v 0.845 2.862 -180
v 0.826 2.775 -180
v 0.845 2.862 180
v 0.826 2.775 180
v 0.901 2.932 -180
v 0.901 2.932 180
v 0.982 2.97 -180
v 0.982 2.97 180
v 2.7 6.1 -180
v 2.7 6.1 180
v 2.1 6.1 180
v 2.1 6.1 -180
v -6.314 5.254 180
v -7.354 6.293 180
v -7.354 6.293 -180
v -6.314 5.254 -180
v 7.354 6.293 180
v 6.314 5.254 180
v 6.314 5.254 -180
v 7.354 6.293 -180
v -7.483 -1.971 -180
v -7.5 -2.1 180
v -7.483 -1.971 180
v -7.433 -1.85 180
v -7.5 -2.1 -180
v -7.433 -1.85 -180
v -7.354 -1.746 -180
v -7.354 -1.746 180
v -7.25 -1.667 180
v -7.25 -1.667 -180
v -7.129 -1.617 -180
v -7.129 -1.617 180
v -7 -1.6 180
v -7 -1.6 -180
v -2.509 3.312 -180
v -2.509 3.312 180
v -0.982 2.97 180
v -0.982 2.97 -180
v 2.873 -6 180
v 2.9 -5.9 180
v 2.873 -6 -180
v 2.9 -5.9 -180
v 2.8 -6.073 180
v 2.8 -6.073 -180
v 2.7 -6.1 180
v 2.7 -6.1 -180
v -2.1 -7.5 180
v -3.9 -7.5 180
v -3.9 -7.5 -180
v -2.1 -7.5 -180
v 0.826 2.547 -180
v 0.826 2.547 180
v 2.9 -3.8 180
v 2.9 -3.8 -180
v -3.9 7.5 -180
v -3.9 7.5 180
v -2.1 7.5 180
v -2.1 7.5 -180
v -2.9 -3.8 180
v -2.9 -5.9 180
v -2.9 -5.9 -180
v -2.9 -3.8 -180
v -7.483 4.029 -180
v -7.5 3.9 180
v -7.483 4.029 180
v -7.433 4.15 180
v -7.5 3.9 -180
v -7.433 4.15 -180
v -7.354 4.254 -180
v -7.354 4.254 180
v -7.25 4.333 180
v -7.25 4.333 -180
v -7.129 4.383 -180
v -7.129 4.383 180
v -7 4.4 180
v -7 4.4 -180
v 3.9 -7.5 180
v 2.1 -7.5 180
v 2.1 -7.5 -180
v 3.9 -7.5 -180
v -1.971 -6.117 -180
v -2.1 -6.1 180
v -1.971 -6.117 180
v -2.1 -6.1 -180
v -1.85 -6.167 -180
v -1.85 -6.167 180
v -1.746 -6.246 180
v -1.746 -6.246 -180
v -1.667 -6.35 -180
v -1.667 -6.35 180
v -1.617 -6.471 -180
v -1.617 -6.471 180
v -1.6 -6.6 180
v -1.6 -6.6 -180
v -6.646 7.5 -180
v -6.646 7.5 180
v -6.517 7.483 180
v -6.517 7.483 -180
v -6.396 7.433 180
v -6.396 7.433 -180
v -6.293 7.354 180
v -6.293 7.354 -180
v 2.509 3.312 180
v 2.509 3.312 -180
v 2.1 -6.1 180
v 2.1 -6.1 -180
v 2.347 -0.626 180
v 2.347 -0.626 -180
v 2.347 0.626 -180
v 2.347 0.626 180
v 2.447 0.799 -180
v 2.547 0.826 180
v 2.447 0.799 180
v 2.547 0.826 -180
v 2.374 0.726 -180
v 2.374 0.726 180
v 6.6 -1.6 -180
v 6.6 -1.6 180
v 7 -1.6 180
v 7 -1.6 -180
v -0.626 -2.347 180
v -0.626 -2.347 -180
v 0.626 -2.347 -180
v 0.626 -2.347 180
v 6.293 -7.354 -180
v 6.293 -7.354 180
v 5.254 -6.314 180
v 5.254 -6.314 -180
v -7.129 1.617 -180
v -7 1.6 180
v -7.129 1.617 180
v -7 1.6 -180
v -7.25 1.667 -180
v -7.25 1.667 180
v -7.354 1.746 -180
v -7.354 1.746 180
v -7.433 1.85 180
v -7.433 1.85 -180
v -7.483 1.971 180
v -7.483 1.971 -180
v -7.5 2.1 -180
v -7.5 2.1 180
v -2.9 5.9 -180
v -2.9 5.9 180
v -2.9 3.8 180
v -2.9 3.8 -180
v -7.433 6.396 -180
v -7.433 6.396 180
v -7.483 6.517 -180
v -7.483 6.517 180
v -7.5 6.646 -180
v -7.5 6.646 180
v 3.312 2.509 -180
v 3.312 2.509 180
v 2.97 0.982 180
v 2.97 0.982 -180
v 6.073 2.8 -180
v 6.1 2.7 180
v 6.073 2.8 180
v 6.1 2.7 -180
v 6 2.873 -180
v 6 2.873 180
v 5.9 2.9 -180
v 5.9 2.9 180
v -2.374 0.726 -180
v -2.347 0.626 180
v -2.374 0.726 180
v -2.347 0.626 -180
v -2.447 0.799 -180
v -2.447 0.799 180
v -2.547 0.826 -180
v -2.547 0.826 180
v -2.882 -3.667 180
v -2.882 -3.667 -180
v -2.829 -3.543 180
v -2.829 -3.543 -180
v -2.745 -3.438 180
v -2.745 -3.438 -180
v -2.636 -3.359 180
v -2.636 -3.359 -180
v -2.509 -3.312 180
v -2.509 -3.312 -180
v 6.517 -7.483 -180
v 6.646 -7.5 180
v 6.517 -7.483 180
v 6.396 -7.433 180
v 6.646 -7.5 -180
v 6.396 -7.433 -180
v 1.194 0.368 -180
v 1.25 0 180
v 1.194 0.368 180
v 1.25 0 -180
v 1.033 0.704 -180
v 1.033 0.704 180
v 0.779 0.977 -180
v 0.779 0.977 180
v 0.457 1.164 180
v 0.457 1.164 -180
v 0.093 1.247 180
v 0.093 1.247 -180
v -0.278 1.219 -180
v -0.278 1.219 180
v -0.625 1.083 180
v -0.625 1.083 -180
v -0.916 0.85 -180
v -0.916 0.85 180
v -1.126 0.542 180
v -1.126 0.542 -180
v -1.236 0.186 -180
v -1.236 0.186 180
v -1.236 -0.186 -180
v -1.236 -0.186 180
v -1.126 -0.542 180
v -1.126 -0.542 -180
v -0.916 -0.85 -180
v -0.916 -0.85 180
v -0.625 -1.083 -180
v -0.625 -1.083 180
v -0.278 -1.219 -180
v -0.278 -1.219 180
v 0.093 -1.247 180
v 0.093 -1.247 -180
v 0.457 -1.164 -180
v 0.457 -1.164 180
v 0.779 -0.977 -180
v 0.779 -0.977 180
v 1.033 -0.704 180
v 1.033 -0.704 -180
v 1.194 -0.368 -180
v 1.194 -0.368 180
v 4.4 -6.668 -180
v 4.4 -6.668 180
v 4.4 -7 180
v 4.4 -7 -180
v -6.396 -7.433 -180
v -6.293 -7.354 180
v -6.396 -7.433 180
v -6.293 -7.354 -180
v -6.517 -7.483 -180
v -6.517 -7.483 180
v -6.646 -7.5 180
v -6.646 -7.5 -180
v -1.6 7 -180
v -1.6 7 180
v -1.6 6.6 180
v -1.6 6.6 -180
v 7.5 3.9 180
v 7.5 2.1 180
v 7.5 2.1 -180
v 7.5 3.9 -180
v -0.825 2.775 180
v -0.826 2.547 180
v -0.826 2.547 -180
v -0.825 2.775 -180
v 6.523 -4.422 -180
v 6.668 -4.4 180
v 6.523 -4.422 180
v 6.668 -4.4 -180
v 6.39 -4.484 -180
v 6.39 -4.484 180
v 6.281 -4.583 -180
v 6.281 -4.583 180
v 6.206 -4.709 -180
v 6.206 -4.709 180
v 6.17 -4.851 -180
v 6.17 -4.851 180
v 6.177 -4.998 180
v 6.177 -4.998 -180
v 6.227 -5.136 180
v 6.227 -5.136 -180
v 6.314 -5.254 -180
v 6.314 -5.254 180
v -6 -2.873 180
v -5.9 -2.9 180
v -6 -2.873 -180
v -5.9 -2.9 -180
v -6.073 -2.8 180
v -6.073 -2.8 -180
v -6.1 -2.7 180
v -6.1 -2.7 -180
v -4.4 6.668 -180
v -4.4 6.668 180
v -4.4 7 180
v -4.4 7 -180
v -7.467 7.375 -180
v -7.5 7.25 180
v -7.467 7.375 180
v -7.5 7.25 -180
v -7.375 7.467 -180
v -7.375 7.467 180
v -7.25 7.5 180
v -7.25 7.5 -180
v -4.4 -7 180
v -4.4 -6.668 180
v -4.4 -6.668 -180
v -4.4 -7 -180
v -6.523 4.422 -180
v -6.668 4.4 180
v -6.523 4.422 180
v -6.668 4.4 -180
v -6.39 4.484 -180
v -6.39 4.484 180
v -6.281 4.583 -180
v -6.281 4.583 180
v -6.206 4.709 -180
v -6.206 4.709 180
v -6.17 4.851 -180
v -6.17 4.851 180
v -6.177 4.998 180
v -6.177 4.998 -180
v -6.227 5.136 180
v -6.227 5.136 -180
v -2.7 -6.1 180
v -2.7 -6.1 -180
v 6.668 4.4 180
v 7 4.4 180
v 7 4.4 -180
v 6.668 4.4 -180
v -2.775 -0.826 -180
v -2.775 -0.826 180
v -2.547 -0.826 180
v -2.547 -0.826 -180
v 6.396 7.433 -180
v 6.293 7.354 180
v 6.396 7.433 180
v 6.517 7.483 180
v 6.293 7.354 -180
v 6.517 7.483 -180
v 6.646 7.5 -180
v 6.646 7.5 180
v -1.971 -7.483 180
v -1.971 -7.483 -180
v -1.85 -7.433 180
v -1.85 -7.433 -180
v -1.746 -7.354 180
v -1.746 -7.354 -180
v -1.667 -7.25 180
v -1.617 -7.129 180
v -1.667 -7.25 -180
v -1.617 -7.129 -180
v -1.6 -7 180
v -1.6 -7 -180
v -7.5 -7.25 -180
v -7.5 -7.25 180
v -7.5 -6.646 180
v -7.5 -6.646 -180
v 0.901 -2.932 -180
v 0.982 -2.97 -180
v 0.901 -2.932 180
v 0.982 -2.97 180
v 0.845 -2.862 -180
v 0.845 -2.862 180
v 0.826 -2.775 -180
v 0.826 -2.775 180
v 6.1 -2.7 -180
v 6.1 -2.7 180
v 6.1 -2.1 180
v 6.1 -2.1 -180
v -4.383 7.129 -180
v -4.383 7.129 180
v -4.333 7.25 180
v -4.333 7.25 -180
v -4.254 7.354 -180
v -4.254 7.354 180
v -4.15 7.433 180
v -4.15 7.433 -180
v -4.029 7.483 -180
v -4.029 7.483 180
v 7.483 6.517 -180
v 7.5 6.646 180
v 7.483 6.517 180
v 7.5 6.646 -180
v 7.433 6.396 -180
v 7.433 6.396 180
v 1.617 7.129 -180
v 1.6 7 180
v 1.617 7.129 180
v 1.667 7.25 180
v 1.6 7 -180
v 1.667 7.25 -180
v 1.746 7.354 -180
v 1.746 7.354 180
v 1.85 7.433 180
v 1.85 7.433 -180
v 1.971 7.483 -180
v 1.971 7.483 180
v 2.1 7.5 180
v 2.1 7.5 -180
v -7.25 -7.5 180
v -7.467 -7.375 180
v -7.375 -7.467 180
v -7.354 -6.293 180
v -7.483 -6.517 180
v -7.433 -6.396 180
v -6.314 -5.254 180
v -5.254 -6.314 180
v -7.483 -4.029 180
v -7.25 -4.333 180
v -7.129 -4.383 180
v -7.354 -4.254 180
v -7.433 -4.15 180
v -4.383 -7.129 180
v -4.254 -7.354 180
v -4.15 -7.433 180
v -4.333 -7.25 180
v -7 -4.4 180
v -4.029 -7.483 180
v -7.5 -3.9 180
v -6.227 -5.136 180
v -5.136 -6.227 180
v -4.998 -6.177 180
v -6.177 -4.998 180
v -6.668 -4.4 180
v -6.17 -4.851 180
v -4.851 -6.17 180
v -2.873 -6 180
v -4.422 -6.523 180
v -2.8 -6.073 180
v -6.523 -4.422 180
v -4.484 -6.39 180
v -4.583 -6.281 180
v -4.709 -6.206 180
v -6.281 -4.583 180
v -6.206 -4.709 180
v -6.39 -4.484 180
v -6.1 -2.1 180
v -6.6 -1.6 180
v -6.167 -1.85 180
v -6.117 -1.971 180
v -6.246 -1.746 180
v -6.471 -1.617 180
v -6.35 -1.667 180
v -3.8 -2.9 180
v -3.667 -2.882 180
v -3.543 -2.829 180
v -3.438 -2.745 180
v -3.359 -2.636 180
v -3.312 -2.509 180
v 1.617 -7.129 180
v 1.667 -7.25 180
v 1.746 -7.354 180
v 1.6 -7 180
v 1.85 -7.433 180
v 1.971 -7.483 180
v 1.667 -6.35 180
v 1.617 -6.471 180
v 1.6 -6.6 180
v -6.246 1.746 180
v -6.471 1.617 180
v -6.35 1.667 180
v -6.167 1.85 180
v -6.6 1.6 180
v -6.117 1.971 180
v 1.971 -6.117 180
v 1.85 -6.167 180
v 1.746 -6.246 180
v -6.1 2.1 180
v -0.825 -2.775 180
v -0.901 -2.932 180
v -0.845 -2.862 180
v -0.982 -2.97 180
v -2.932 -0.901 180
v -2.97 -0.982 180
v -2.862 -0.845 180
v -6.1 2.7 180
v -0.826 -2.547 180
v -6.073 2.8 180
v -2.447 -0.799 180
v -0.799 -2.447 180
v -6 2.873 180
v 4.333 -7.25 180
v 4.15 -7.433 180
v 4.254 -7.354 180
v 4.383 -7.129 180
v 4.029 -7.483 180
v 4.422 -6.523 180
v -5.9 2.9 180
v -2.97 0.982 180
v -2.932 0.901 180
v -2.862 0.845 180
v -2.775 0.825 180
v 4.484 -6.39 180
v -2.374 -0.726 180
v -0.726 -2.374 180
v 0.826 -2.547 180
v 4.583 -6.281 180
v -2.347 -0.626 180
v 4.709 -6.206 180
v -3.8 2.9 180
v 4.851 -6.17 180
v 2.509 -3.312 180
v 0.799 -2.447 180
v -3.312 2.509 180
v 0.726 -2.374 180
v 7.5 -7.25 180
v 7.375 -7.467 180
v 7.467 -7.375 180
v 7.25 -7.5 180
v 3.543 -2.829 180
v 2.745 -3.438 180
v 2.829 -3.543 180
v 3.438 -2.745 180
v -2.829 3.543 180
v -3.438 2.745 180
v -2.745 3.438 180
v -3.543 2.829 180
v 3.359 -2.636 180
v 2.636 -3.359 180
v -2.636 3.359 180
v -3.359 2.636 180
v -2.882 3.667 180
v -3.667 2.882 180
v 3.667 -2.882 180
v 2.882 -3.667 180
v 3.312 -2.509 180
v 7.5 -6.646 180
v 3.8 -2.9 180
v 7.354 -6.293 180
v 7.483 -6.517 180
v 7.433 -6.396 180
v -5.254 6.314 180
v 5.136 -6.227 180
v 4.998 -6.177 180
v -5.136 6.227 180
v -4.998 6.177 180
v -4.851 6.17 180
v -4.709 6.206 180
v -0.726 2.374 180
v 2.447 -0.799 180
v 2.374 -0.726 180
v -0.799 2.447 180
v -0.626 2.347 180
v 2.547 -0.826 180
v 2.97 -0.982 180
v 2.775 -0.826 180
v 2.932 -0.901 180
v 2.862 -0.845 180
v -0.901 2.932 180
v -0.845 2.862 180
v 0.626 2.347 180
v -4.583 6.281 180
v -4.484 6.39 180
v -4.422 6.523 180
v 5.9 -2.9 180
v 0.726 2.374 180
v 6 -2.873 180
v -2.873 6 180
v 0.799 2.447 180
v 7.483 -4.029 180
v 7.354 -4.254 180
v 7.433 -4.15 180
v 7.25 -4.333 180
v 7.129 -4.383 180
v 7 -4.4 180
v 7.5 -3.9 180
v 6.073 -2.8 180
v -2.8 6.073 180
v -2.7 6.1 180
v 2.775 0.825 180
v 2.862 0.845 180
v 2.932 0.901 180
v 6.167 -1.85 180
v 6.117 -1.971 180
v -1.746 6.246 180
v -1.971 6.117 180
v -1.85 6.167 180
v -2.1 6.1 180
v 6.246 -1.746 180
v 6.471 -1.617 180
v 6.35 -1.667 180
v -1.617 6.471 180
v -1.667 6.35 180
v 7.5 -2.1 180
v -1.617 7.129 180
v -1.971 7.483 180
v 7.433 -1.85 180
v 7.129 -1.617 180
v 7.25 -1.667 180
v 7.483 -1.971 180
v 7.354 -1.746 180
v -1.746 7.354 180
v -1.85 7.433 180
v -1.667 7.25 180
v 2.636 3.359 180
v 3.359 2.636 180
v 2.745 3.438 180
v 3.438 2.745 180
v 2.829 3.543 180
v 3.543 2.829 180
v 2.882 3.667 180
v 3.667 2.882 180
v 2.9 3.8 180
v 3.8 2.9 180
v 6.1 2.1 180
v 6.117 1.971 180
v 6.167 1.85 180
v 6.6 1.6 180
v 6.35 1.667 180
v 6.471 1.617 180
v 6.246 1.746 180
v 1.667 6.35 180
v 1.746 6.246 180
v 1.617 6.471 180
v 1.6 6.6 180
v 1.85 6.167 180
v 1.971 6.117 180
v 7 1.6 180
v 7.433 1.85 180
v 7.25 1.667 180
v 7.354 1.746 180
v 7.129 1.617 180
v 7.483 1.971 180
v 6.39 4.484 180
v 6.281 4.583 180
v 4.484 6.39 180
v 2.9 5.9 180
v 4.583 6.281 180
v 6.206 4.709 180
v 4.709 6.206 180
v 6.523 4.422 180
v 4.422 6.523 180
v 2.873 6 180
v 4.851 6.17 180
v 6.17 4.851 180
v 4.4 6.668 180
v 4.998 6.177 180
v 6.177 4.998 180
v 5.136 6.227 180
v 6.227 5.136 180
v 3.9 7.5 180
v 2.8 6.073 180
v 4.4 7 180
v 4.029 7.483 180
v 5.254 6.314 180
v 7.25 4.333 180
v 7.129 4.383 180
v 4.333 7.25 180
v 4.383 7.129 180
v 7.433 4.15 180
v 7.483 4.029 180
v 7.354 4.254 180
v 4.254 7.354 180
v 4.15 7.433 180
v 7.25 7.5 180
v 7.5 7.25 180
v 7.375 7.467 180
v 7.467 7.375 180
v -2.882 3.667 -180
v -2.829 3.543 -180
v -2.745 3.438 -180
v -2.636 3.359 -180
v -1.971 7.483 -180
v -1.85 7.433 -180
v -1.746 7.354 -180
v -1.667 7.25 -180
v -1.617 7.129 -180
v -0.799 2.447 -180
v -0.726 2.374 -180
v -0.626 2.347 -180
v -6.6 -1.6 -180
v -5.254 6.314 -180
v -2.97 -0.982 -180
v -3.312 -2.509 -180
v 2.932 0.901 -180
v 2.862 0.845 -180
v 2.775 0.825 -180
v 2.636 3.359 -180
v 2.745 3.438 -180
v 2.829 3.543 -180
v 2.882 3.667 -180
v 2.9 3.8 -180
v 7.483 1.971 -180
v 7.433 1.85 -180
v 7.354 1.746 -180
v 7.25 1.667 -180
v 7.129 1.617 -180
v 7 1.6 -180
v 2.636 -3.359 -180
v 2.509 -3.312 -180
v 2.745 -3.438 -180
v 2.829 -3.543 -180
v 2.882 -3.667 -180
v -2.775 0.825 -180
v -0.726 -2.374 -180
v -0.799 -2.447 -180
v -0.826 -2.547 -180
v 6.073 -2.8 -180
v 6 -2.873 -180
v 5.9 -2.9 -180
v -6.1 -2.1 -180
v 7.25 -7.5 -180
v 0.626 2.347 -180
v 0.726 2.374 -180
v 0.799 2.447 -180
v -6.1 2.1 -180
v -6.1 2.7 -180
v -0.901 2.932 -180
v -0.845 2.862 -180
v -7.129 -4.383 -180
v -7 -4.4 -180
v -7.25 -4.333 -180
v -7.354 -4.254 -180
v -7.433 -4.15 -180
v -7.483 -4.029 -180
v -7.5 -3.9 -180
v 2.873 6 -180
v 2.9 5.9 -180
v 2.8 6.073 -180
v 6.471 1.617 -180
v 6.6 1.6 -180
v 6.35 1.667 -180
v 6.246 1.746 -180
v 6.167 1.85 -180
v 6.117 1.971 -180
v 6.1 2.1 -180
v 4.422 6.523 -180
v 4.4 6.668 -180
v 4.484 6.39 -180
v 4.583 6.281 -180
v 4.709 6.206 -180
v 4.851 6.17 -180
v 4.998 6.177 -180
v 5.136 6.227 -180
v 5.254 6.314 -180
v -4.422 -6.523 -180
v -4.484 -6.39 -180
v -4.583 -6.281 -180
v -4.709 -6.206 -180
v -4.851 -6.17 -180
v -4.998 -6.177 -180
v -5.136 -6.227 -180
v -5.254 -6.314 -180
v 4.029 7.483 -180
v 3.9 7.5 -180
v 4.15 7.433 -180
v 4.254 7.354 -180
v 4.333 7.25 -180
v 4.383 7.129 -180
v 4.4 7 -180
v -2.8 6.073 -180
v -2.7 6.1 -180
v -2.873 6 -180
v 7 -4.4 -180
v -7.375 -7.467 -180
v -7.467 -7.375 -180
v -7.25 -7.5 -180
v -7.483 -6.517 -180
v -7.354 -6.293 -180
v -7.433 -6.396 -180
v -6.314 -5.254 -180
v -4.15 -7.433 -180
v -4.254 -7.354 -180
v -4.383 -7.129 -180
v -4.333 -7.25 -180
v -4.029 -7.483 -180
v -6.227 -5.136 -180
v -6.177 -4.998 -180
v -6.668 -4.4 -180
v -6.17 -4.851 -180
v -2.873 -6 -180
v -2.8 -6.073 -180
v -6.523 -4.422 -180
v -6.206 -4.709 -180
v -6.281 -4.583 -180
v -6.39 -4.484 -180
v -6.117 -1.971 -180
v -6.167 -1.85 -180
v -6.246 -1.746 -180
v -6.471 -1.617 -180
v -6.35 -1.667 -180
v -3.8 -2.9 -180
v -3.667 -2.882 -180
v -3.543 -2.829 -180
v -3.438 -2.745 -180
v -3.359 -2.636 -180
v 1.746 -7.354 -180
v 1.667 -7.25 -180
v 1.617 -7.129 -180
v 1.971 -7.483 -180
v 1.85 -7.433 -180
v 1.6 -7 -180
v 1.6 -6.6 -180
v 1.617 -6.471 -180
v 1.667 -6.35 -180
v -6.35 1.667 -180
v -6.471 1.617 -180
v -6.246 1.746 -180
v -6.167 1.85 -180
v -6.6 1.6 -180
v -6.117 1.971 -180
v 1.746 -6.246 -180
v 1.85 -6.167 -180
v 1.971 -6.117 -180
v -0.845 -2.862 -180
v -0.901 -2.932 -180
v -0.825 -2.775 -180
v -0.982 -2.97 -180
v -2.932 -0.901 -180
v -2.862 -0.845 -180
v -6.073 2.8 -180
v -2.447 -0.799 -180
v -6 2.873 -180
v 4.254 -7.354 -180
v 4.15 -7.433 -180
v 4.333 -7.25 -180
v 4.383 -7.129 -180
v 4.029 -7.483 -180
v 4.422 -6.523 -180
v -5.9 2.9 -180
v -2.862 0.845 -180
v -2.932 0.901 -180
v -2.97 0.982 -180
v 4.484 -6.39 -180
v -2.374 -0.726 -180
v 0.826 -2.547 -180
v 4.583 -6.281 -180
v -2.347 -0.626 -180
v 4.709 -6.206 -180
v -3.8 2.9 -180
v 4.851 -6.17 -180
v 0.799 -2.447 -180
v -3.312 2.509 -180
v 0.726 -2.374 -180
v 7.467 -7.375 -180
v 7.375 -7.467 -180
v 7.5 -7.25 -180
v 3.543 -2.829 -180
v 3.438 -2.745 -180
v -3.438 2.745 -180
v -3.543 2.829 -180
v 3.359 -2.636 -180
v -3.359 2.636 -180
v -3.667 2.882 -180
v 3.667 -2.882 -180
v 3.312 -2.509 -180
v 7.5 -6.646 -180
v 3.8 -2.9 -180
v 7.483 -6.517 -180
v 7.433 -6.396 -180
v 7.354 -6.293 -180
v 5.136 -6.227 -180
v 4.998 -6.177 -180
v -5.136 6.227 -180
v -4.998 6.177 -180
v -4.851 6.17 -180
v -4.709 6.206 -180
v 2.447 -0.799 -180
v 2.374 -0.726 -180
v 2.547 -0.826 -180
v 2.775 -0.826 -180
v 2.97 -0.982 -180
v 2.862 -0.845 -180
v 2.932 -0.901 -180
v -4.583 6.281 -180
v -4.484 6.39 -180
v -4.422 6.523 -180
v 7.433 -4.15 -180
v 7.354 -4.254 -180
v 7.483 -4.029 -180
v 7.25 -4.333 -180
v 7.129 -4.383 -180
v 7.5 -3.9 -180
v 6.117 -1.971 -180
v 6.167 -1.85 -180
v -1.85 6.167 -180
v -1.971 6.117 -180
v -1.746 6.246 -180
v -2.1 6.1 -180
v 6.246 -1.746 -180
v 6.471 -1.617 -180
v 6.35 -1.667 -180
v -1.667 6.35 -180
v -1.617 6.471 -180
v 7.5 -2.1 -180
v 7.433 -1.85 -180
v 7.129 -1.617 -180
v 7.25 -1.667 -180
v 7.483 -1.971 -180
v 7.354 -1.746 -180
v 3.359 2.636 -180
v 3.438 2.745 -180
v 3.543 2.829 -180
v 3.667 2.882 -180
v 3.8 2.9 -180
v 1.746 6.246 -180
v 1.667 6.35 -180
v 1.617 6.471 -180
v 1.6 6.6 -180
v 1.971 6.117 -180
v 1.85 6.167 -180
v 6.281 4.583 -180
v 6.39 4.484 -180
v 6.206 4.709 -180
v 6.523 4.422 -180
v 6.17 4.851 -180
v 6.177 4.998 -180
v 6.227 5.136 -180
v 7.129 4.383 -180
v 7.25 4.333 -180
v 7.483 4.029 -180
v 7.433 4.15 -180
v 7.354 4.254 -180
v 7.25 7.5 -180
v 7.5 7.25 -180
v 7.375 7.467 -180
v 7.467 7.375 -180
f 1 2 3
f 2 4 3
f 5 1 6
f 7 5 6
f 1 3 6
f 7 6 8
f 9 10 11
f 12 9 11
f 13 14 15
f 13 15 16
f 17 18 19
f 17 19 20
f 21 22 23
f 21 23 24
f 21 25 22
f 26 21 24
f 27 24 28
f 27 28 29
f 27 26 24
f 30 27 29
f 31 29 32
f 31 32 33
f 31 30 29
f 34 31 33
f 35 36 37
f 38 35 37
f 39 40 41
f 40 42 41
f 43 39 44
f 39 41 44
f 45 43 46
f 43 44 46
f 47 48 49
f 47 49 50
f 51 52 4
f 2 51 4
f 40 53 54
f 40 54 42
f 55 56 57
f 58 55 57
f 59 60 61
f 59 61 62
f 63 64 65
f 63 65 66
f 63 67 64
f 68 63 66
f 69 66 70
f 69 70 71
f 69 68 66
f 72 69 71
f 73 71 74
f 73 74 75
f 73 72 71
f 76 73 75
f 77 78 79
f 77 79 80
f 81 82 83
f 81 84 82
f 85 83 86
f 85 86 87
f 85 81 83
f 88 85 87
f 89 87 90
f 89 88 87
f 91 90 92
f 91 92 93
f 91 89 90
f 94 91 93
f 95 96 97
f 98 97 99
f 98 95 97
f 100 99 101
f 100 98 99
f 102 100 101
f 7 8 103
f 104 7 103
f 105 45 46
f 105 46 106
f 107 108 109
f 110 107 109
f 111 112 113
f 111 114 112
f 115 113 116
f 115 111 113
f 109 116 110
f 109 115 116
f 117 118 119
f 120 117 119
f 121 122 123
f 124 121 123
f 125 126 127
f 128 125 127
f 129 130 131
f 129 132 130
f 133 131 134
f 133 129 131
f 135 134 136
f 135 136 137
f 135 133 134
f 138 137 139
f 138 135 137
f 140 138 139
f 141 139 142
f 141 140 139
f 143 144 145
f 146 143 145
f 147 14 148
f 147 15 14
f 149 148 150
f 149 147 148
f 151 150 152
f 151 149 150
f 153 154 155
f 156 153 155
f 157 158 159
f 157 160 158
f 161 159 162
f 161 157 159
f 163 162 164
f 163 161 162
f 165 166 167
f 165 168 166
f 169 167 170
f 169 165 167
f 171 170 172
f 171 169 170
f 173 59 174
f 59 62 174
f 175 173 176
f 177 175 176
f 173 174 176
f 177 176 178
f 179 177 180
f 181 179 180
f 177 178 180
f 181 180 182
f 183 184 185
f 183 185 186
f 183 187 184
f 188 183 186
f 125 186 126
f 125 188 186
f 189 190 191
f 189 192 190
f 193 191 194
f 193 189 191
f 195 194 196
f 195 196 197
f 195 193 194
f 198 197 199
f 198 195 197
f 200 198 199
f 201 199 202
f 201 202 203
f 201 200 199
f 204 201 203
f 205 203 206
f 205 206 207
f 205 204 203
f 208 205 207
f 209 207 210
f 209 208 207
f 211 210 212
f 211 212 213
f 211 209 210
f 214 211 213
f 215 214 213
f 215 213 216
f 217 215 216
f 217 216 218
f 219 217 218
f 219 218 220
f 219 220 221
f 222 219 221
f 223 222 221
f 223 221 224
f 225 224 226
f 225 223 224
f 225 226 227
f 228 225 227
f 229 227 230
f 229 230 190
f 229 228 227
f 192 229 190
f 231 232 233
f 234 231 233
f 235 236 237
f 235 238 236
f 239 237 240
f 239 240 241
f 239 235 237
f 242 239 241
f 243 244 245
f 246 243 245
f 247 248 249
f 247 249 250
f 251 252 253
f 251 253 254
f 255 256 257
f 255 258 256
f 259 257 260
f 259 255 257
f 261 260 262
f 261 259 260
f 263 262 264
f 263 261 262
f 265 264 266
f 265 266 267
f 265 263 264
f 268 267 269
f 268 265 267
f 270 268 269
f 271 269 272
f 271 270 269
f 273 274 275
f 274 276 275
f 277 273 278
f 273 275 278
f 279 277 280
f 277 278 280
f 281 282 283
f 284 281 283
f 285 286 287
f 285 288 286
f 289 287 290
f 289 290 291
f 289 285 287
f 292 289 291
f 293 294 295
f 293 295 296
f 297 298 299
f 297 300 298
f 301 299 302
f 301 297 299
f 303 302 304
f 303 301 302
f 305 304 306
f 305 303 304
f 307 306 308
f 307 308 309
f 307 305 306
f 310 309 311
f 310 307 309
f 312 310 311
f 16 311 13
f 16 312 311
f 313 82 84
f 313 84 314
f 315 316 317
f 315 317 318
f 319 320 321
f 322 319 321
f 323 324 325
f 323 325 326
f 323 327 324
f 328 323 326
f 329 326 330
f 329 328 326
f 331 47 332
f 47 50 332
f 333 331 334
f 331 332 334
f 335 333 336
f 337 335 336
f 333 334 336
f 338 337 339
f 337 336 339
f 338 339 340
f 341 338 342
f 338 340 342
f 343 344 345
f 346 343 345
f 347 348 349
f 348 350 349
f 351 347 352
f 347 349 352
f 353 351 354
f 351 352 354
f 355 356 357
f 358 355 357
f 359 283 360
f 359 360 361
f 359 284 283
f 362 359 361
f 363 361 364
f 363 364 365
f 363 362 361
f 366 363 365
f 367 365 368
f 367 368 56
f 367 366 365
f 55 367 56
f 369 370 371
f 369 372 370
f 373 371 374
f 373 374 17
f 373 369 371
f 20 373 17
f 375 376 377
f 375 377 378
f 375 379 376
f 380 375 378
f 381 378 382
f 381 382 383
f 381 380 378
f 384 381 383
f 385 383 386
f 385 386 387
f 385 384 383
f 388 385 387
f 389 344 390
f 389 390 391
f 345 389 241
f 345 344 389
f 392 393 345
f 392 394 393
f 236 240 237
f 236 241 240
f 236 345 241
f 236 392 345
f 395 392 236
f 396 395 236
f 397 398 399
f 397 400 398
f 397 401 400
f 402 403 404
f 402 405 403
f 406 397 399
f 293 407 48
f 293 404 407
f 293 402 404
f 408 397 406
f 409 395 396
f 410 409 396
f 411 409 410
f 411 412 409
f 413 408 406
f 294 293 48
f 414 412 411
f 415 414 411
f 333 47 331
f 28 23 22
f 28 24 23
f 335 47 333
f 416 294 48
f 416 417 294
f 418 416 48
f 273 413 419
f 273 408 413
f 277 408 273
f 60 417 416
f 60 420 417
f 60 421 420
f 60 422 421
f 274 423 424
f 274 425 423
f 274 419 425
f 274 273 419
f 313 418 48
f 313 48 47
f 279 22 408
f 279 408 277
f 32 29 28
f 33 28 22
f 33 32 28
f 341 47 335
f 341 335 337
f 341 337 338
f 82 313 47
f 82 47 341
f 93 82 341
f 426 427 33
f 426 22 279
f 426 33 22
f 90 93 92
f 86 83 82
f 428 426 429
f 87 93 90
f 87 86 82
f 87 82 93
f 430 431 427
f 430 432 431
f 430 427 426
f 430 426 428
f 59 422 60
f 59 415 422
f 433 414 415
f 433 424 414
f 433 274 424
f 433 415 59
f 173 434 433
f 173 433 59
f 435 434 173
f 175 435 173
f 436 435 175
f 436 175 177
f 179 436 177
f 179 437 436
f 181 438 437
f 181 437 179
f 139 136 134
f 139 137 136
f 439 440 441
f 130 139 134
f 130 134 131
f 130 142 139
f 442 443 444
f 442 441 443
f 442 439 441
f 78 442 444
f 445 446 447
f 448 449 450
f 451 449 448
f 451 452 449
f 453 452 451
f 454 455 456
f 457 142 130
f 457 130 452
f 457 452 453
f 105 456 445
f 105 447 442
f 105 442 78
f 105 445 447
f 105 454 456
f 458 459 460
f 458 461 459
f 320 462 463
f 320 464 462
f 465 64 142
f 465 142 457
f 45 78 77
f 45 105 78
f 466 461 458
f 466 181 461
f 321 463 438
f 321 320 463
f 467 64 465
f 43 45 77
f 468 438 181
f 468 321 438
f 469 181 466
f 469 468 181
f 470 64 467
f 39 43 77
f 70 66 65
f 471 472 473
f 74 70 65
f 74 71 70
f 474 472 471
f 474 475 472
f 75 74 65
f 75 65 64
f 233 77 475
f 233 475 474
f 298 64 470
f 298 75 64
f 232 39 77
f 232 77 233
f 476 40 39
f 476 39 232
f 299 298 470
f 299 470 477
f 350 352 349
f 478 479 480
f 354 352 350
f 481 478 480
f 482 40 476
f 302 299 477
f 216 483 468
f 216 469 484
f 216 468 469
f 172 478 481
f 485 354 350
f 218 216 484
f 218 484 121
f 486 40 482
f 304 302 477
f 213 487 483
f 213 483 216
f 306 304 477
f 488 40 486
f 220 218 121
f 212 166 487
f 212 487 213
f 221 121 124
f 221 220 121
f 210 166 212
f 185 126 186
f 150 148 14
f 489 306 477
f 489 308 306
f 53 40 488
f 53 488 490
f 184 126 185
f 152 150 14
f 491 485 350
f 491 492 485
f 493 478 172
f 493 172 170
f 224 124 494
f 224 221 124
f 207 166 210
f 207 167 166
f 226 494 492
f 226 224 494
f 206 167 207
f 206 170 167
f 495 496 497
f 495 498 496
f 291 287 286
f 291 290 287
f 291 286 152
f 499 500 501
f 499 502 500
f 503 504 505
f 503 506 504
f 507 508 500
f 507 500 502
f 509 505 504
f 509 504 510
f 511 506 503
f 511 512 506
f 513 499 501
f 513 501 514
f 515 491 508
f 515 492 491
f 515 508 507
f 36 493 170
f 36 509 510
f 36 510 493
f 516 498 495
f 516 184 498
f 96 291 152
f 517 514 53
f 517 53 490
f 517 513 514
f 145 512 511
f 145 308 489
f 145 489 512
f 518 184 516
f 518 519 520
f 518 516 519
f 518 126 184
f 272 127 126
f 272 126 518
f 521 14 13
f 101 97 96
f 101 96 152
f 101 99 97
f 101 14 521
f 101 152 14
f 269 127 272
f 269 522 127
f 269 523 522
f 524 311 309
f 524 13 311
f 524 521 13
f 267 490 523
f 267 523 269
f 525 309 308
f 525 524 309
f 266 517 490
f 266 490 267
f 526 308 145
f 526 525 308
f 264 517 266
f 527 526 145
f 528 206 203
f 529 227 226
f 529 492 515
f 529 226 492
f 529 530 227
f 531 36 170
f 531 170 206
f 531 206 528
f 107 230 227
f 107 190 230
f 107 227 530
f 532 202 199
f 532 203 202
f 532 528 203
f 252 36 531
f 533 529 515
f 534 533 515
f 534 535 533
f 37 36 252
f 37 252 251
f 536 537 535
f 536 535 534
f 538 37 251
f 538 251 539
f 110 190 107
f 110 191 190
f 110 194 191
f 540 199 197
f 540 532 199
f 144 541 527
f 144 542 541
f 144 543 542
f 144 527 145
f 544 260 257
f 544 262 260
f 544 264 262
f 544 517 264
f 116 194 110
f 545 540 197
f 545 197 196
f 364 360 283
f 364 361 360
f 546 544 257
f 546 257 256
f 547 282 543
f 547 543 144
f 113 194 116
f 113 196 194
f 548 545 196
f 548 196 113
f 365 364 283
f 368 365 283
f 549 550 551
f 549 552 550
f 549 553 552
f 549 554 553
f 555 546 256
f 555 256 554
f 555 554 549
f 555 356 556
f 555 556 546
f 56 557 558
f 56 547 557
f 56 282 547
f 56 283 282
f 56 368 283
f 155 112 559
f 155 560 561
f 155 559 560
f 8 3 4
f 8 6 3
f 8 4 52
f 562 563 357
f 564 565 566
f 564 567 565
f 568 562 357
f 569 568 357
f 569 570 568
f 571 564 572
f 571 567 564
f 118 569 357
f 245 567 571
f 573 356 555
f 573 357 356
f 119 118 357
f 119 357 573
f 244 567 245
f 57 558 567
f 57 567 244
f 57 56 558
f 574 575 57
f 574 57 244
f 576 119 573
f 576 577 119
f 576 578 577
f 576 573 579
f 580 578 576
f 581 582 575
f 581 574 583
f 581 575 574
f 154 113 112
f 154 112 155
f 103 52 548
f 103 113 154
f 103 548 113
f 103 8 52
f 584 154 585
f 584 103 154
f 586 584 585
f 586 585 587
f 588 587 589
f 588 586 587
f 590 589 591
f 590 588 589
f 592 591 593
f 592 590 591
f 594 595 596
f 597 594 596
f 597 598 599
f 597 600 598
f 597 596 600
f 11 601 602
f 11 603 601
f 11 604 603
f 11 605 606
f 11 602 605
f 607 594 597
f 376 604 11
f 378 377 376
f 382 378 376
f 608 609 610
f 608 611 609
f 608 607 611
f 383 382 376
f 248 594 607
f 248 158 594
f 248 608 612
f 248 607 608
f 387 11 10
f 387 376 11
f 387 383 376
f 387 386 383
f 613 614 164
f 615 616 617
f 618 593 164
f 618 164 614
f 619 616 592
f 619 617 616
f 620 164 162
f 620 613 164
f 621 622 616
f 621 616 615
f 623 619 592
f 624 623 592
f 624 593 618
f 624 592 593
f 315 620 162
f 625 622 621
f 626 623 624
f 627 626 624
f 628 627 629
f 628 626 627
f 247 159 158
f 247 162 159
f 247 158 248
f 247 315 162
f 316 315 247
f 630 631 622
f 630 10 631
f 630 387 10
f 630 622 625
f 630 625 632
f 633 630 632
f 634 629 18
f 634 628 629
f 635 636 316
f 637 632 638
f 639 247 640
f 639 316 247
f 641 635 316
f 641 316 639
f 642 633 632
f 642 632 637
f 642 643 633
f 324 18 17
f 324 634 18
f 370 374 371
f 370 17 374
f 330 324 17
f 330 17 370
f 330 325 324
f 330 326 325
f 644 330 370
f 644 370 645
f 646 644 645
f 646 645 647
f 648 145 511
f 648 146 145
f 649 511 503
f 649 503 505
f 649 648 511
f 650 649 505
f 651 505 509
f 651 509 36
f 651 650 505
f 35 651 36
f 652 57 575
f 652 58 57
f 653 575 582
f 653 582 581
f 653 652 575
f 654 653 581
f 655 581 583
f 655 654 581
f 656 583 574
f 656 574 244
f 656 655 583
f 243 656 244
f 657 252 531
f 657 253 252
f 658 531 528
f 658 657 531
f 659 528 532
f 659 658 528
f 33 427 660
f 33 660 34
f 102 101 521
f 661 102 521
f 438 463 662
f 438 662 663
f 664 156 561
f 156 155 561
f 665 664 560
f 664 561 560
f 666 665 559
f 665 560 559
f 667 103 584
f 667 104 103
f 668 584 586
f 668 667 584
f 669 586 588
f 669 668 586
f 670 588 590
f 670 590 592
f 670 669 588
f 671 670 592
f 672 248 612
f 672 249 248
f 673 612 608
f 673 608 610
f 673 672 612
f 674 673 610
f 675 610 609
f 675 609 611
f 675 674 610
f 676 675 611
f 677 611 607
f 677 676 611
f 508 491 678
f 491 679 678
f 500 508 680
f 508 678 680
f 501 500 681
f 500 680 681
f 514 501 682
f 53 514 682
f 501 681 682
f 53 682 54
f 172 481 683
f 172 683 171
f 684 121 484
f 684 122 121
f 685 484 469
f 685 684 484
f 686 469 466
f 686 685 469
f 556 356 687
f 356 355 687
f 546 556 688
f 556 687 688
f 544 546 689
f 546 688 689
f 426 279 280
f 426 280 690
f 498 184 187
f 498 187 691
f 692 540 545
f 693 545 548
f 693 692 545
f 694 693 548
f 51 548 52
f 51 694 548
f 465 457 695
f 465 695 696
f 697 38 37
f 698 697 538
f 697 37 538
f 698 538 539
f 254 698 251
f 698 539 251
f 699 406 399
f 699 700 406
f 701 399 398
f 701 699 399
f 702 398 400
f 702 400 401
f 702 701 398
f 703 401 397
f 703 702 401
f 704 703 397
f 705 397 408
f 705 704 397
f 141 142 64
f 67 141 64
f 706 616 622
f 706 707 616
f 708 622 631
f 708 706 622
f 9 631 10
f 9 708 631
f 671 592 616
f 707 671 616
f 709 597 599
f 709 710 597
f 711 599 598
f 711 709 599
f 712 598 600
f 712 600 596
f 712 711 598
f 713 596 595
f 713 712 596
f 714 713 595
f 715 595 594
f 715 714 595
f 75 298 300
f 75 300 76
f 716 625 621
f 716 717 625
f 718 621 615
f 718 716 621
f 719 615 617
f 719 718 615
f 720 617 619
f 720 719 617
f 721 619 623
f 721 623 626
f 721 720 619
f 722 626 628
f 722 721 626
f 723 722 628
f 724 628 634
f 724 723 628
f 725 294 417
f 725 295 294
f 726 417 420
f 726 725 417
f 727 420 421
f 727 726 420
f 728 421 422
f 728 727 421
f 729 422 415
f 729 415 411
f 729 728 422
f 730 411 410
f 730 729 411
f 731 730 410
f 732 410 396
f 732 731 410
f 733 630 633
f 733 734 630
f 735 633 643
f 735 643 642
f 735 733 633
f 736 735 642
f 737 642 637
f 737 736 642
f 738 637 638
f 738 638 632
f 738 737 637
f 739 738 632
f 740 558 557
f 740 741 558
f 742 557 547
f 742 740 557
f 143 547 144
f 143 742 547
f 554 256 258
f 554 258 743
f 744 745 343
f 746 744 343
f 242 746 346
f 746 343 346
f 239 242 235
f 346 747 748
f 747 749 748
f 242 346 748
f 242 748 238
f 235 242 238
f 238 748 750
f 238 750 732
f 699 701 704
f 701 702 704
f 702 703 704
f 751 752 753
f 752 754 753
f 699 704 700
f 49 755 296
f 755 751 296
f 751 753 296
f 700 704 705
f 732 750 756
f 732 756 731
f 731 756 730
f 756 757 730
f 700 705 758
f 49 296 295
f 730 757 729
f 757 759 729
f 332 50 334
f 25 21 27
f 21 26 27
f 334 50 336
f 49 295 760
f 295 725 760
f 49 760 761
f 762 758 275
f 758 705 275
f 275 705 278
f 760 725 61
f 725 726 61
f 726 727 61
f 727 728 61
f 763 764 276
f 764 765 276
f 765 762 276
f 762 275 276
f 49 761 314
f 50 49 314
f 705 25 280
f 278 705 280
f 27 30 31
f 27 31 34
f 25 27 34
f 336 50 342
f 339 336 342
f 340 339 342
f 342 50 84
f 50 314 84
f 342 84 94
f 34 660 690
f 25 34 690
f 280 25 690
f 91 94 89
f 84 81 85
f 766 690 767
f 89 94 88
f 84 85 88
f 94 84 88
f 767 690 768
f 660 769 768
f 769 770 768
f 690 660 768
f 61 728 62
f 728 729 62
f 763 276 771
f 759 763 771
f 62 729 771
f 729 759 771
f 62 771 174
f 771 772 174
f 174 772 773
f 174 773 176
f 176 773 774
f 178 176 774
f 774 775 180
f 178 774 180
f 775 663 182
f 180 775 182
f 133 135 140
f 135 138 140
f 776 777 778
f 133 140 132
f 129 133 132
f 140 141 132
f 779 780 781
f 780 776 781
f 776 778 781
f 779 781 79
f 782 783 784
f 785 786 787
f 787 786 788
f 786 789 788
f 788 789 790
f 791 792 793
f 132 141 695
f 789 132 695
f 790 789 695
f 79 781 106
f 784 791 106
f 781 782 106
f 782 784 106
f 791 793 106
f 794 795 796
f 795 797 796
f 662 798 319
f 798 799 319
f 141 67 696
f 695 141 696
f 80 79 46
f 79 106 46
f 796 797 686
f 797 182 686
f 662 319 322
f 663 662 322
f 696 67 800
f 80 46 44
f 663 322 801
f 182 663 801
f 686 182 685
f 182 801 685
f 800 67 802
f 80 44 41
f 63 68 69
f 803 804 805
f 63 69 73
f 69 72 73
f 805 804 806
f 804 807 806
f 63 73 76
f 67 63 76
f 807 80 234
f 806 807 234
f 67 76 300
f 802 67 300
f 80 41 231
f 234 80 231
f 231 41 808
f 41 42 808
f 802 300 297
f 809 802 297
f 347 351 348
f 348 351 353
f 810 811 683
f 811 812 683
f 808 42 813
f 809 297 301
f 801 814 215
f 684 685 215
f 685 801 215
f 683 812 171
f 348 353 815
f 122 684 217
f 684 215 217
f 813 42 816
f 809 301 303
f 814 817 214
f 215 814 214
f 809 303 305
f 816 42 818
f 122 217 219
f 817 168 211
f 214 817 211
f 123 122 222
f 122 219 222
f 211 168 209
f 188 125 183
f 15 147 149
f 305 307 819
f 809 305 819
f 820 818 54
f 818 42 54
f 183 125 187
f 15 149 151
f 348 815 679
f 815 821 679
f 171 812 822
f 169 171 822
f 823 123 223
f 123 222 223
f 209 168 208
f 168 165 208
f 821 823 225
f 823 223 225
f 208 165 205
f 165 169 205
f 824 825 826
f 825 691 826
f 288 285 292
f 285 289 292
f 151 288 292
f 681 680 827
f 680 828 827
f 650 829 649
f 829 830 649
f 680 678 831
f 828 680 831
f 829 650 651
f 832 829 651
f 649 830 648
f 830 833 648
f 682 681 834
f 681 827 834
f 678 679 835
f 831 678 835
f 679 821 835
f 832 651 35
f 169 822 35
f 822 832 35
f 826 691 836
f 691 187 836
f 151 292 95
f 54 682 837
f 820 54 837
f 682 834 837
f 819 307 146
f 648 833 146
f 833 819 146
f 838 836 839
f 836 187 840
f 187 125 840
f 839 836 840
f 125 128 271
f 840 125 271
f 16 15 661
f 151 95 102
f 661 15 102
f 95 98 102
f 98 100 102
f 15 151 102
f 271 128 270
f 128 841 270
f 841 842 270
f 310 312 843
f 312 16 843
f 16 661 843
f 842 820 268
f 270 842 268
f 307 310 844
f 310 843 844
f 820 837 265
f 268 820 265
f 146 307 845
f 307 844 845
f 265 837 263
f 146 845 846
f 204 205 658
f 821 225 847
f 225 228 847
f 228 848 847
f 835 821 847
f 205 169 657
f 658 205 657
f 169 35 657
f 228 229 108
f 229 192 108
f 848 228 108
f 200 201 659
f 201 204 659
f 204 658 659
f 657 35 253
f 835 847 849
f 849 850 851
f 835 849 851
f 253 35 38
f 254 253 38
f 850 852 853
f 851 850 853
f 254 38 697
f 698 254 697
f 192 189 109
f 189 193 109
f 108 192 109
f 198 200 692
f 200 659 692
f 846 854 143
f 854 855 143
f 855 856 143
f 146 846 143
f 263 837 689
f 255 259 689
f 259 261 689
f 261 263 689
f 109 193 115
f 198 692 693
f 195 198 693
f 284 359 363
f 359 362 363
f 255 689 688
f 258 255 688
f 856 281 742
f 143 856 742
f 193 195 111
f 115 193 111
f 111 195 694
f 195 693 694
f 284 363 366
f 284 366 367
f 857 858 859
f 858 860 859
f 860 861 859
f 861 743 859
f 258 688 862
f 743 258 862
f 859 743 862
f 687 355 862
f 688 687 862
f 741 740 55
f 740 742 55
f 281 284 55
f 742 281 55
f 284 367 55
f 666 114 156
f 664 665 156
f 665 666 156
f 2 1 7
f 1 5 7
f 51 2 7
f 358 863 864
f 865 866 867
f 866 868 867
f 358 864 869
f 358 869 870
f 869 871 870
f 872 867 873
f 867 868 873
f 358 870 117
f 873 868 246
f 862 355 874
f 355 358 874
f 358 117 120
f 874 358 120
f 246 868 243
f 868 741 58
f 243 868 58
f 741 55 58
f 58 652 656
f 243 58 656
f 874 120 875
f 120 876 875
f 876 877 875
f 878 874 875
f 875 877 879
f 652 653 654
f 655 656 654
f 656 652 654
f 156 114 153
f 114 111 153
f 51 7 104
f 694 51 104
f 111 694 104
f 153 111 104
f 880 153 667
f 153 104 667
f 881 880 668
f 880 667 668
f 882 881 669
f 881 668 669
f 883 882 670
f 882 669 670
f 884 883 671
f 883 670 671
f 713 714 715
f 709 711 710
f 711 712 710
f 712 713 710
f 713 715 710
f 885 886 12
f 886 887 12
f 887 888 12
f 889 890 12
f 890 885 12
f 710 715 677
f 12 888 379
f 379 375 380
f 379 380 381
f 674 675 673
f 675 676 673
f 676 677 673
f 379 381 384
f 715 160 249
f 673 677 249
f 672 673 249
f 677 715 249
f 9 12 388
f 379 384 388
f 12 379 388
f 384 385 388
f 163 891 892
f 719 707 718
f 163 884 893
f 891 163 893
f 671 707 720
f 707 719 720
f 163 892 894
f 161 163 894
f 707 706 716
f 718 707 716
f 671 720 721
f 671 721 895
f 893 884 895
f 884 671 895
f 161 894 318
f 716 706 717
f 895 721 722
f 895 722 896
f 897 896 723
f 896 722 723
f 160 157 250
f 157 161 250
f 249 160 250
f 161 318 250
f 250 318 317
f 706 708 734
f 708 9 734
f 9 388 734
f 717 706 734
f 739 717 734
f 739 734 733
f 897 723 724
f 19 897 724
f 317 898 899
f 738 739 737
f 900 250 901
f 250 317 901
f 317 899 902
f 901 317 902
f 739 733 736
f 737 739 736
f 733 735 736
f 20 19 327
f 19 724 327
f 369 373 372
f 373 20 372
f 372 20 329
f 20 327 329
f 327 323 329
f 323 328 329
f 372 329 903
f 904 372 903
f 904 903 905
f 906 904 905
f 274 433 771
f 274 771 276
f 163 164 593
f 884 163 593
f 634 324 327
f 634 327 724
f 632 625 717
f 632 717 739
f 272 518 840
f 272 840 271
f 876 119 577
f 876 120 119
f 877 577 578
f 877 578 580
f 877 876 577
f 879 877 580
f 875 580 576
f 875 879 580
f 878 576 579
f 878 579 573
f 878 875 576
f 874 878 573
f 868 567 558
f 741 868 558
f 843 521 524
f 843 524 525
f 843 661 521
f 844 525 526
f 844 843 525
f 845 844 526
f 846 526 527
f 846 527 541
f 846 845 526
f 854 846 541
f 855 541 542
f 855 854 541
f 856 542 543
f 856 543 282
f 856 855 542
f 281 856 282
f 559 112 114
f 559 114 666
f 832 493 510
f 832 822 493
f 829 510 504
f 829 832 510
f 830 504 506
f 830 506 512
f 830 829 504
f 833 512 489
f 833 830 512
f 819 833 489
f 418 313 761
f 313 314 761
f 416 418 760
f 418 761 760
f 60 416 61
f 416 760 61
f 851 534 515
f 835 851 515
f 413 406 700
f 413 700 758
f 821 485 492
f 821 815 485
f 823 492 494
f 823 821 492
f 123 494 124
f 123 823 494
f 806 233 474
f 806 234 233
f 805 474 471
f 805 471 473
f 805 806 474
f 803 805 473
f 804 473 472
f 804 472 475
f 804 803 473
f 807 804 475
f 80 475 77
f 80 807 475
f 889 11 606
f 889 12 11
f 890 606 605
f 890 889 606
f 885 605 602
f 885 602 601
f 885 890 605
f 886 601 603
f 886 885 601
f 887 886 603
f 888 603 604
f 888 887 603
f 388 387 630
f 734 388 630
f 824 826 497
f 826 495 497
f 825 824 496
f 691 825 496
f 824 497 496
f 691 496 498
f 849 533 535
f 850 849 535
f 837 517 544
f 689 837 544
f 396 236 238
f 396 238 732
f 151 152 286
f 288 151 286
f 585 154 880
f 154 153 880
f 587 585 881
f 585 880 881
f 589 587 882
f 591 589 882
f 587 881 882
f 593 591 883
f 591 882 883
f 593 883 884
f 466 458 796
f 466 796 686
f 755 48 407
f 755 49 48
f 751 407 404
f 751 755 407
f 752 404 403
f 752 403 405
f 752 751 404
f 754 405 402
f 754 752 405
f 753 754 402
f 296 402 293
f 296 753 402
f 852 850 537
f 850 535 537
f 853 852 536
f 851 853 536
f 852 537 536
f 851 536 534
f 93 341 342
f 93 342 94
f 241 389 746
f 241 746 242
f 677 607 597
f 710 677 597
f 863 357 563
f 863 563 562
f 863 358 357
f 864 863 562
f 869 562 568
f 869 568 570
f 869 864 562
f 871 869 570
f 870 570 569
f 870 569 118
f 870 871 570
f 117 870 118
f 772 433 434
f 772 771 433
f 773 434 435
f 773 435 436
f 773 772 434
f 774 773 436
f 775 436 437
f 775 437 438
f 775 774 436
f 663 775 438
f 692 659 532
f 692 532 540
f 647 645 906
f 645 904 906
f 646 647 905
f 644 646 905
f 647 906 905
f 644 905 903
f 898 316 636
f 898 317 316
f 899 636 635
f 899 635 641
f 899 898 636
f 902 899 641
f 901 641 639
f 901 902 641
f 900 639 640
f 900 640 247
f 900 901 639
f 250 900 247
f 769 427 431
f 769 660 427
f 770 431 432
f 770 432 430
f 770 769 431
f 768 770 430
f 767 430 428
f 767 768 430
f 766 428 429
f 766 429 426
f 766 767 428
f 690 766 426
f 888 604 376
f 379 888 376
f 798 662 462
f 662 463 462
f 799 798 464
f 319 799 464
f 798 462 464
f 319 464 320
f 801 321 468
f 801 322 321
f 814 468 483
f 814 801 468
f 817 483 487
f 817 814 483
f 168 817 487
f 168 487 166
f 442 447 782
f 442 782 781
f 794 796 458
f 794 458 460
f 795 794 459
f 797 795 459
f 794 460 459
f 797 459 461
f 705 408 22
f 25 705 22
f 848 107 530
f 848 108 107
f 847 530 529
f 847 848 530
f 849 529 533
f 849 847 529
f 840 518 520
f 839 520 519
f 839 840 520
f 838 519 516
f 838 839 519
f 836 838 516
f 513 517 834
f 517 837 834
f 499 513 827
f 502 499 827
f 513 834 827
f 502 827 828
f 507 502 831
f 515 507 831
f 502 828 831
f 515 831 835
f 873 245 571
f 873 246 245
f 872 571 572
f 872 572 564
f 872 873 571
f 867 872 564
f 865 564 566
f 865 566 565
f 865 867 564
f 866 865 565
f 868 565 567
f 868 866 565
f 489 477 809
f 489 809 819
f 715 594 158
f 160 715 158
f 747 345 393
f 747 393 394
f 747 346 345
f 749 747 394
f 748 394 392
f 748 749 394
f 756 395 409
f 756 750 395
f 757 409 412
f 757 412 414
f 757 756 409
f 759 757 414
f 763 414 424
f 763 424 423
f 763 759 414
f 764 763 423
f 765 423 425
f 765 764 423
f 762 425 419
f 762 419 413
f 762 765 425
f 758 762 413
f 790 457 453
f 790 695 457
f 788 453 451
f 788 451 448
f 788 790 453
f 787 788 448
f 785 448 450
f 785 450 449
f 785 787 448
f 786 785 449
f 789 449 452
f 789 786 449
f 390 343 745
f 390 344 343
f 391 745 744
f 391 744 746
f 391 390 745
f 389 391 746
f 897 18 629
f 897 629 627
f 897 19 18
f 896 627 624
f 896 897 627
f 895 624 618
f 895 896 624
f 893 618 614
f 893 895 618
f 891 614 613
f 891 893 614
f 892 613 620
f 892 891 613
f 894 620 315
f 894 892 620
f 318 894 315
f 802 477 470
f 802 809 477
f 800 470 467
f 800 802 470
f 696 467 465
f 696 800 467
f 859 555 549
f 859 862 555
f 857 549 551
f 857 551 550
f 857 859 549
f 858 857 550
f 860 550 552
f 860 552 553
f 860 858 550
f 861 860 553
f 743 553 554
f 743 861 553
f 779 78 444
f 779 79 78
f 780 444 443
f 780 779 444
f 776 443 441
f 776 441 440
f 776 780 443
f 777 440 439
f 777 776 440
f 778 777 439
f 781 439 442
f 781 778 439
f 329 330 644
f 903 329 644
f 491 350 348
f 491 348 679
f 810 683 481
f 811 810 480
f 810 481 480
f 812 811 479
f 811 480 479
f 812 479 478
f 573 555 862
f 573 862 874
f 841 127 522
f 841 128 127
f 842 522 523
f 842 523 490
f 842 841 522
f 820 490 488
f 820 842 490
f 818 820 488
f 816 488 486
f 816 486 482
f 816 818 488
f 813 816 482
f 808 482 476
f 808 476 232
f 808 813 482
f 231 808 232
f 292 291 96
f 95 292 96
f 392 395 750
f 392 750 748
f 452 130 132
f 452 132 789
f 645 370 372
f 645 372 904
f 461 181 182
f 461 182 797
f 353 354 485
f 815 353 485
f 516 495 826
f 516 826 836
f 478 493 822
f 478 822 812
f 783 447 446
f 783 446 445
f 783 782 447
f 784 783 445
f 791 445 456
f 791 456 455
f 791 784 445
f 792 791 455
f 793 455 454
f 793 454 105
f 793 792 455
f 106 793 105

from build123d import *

# Parameters (mm, degrees)
SKETCH1_W           = 15
SKETCH1_H           = 15
SKETCH1_R           = 1.25
BOSS_EXTRUDE1_DEPTH = 180
FILLET1_R           = 0.25
CUT_EXTRUDE1_DEPTH  = 361
CUT_EXTRUDE3_DEPTH  = 361
FILLET3_R           = 0.5
FILLET4_R           = 0.5
FILLET5_R           = 3
FILLET6_R           = 0.2
CUT_EXTRUDE4_DEPTH  = 361
FILLET8_R           = 0.5
SKETCH6_W           = 5.1529354
SKETCH6_H           = 1.651
SKETCH6_W_2         = 1.651
SKETCH6_H_2         = 5.1529354
CUT_EXTRUDE5_DEPTH  = 361
FILLET10_R          = 0.2


with BuildPart() as part:
    # Sketch1 → Boss-Extrude1 (new body, symmetric)
    with BuildSketch(Plane.XY):
        Rectangle(SKETCH1_W, SKETCH1_H)
        Circle(SKETCH1_R, mode=Mode.SUBTRACT)
    extrude(amount=BOSS_EXTRUDE1_DEPTH, both=True)

    # Fillet1
    fillet1_edges = [part.edges().sort_by_distance(p)[0] for p in [
        (7.5, -7.5, 0),
        (-7.5, -7.5, 0),
        (-7.5, 7.5, 0),
        (7.5, 7.5, 0),
    ]]
    fillet(fillet1_edges, radius=FILLET1_R)

    # Sketch2 → Cut-Extrude1 (cut, through all)
    with BuildSketch(Plane.XY.offset(180)):
        Polygon((-7.5, 1.6), (-6.1, 1.6), (-6.1, 2.9), (-3.4, 2.9), (-3.4, -2.9), (-6.1, -2.9), (-6.1, -1.6), (-7.5, -1.6), align=None)
        Polygon((2.9, 6.1), (1.6, 6.1), (1.6, 7.5), (-1.6, 7.5), (-1.6, 6.1), (-2.9, 6.1), (-2.9, 3.4), (2.9, 3.4), align=None)
        Polygon((-1.6, -7.5), (-1.6, -6.1), (-2.9, -6.1), (-2.9, -3.4), (2.9, -3.4), (2.9, -6.1), (1.6, -6.1), (1.6, -7.5), align=None)
        Polygon((6.1, -2.9), (6.1, -1.6), (7.5, -1.6), (7.5, 1.6), (6.1, 1.6), (6.1, 2.9), (3.4, 2.9), (3.4, -2.9), align=None)
    extrude(amount=-CUT_EXTRUDE1_DEPTH, mode=Mode.SUBTRACT)

    # Sketch4 → Cut-Extrude3 (cut, through all)
    with BuildSketch(Plane.XY.offset(180)):
        Polygon((-3.4, 2.9), (-2.75, 0), (-3.4, -2.9), align=None)
        Polygon((-2.9, 3.4), (0, 2.75), (2.9, 3.4), align=None)
        Polygon((3.4, 2.9), (2.75, 0), (3.4, -2.9), align=None)
        Polygon((-2.9, -3.4), (0, -2.75), (2.9, -3.4), align=None)
    extrude(amount=-CUT_EXTRUDE3_DEPTH, mode=Mode.SUBTRACT)

    # Fillet3
    fillet3_edges = [part.edges().sort_by_distance(p)[0] for p in [
        (1.6, -7.5, 0),
        (-1.6, -7.5, 0),
        (-1.6, -6.1, 0),
        (1.6, -6.1, 0),
        (6.1, 1.6, 0),
        (7.5, 1.6, 0),
        (7.5, -1.6, 0),
        (6.1, -1.6, 0),
        (-7.5, -1.6, 0),
        (-7.5, 1.6, 0),
        (-6.1, 1.6, 0),
        (-6.1, -1.6, 0),
        (-1.6, 6.1, 0),
        (-1.6, 7.5, 0),
        (1.6, 7.5, 0),
        (1.6, 6.1, 0),
    ]]
    fillet(fillet3_edges, radius=FILLET3_R)

    # Fillet4
    fillet4_edges = [part.edges().sort_by_distance(p)[0] for p in [
        (-2.9, -3.4, 0),
        (2.9, -3.4, 0),
        (3.4, -2.9, 0),
        (3.4, 2.9, 0),
        (-3.4, 2.9, 0),
        (-3.4, -2.9, 0),
        (2.9, 3.4, 0),
        (-2.9, 3.4, 0),
    ]]
    fillet(fillet4_edges, radius=FILLET4_R)

    # Fillet5
    fillet5_edges = [part.edges().sort_by_distance(p)[0] for p in [
        (-2.75, 0, 0),
        (0, 2.75, 0),
        (2.75, 0, 0),
        (0, -2.75, 0),
    ]]
    fillet(fillet5_edges, radius=FILLET5_R)

    # Fillet6
    fillet6_edges = [part.edges().sort_by_distance(p)[0] for p in [
        (-2.9, -6.1, 0),
        (2.9, -6.1, 0),
        (6.1, -2.9, 0),
        (6.1, 2.9, 0),
        (-6.1, 2.9, 0),
        (-6.1, -2.9, 0),
        (2.9, 6.1, 0),
        (-2.9, 6.1, 0),
    ]]
    fillet(fillet6_edges, radius=FILLET6_R)

    # Sketch5 → Cut-Extrude4 (cut, through all)
    with BuildSketch(Plane.XY.offset(180)):
        Polygon((-7.5, 6.439339828), (-5.460660172, 4.4), (-7.5, 4.4), align=None)
        Polygon((-6.439339828, 7.5), (-4.4, 5.460660172), (-4.4, 7.5), align=None)
        Polygon((4.4, 7.5), (6.439339828, 7.5), (4.4, 5.460660172), align=None)
        Polygon((7.5, 6.439339828), (7.5, 4.4), (5.460660172, 4.4), align=None)
        Polygon((7.5, -6.439339828), (5.460660172, -4.4), (7.5, -4.4), align=None)
        Polygon((6.439339828, -7.5), (4.4, -5.460660172), (4.4, -7.5), align=None)
        Polygon((-4.4, -7.5), (-6.439339828, -7.5), (-4.4, -5.460660172), align=None)
        Polygon((-7.5, -6.439339828), (-7.5, -4.4), (-5.460660172, -4.4), align=None)
    extrude(amount=-CUT_EXTRUDE4_DEPTH, mode=Mode.SUBTRACT)

    # Fillet8
    fillet8_edges = [part.edges().sort_by_distance(p)[0] for p in [
        (-7.5, 4.4, 0),
        (-7.5, 6.439339828, 0),
        (-5.460660172, 4.4, 0),
        (7.5, -4.4, 0),
        (7.5, -6.439339828, 0),
        (5.460660172, -4.4, 0),
        (5.460660172, 4.4, 0),
        (7.5, 6.439339828, 0),
        (7.5, 4.4, 0),
        (-4.4, 7.5, 0),
        (-4.4, 5.460660172, 0),
        (-6.439339828, 7.5, 0),
        (-5.460660172, -4.4, 0),
        (-7.5, -6.439339828, 0),
        (-7.5, -4.4, 0),
        (4.4, 5.460660172, 0),
        (4.4, 7.5, 0),
        (6.439339828, 7.5, 0),
        (6.439339828, -7.5, 0),
        (4.4, -7.5, 0),
        (4.4, -5.460660172, 0),
        (-6.439339828, -7.5, 0),
        (-4.4, -5.460660172, 0),
        (-4.4, -7.5, 0),
    ]]
    fillet(fillet8_edges, radius=FILLET8_R)

    # Sketch6 → Cut-Extrude5 (cut, through all)
    with BuildSketch(Plane.XY.offset(180)):
        with Locations((4.9235323, 0)):
            Rectangle(SKETCH6_W, SKETCH6_H)
        with Locations((0, -4.9235323)):
            Rectangle(SKETCH6_W_2, SKETCH6_H_2)
        with Locations((-4.9235323, 0)):
            Rectangle(SKETCH6_W, SKETCH6_H)
        with Locations((0, 4.9235323)):
            Rectangle(SKETCH6_W_2, SKETCH6_H_2)
    extrude(amount=-CUT_EXTRUDE5_DEPTH, mode=Mode.SUBTRACT)

    # Fillet10
    fillet10_edges = [part.edges().sort_by_distance(p)[0] for p in [
        (0.8255, -2.935025862, 0),
        (-0.8255, -2.935025862, 0),
        (0.8255, -2.3470646, 0),
        (-0.8255, -2.3470646, 0),
        (2.935025862, 0.8255, 0),
        (2.935025862, -0.8255, 0),
        (2.3470646, 0.8255, 0),
        (2.3470646, -0.8255, 0),
        (-2.935025862, -0.8255, 0),
        (-2.935025862, 0.8255, 0),
        (-2.3470646, -0.8255, 0),
        (-2.3470646, 0.8255, 0),
        (-0.8255, 2.935025862, 0),
        (0.8255, 2.935025862, 0),
        (-0.8255, 2.3470646, 0),
        (0.8255, 2.3470646, 0),
    ]]
    fillet(fillet10_edges, radius=FILLET10_R)


solid = part.part
